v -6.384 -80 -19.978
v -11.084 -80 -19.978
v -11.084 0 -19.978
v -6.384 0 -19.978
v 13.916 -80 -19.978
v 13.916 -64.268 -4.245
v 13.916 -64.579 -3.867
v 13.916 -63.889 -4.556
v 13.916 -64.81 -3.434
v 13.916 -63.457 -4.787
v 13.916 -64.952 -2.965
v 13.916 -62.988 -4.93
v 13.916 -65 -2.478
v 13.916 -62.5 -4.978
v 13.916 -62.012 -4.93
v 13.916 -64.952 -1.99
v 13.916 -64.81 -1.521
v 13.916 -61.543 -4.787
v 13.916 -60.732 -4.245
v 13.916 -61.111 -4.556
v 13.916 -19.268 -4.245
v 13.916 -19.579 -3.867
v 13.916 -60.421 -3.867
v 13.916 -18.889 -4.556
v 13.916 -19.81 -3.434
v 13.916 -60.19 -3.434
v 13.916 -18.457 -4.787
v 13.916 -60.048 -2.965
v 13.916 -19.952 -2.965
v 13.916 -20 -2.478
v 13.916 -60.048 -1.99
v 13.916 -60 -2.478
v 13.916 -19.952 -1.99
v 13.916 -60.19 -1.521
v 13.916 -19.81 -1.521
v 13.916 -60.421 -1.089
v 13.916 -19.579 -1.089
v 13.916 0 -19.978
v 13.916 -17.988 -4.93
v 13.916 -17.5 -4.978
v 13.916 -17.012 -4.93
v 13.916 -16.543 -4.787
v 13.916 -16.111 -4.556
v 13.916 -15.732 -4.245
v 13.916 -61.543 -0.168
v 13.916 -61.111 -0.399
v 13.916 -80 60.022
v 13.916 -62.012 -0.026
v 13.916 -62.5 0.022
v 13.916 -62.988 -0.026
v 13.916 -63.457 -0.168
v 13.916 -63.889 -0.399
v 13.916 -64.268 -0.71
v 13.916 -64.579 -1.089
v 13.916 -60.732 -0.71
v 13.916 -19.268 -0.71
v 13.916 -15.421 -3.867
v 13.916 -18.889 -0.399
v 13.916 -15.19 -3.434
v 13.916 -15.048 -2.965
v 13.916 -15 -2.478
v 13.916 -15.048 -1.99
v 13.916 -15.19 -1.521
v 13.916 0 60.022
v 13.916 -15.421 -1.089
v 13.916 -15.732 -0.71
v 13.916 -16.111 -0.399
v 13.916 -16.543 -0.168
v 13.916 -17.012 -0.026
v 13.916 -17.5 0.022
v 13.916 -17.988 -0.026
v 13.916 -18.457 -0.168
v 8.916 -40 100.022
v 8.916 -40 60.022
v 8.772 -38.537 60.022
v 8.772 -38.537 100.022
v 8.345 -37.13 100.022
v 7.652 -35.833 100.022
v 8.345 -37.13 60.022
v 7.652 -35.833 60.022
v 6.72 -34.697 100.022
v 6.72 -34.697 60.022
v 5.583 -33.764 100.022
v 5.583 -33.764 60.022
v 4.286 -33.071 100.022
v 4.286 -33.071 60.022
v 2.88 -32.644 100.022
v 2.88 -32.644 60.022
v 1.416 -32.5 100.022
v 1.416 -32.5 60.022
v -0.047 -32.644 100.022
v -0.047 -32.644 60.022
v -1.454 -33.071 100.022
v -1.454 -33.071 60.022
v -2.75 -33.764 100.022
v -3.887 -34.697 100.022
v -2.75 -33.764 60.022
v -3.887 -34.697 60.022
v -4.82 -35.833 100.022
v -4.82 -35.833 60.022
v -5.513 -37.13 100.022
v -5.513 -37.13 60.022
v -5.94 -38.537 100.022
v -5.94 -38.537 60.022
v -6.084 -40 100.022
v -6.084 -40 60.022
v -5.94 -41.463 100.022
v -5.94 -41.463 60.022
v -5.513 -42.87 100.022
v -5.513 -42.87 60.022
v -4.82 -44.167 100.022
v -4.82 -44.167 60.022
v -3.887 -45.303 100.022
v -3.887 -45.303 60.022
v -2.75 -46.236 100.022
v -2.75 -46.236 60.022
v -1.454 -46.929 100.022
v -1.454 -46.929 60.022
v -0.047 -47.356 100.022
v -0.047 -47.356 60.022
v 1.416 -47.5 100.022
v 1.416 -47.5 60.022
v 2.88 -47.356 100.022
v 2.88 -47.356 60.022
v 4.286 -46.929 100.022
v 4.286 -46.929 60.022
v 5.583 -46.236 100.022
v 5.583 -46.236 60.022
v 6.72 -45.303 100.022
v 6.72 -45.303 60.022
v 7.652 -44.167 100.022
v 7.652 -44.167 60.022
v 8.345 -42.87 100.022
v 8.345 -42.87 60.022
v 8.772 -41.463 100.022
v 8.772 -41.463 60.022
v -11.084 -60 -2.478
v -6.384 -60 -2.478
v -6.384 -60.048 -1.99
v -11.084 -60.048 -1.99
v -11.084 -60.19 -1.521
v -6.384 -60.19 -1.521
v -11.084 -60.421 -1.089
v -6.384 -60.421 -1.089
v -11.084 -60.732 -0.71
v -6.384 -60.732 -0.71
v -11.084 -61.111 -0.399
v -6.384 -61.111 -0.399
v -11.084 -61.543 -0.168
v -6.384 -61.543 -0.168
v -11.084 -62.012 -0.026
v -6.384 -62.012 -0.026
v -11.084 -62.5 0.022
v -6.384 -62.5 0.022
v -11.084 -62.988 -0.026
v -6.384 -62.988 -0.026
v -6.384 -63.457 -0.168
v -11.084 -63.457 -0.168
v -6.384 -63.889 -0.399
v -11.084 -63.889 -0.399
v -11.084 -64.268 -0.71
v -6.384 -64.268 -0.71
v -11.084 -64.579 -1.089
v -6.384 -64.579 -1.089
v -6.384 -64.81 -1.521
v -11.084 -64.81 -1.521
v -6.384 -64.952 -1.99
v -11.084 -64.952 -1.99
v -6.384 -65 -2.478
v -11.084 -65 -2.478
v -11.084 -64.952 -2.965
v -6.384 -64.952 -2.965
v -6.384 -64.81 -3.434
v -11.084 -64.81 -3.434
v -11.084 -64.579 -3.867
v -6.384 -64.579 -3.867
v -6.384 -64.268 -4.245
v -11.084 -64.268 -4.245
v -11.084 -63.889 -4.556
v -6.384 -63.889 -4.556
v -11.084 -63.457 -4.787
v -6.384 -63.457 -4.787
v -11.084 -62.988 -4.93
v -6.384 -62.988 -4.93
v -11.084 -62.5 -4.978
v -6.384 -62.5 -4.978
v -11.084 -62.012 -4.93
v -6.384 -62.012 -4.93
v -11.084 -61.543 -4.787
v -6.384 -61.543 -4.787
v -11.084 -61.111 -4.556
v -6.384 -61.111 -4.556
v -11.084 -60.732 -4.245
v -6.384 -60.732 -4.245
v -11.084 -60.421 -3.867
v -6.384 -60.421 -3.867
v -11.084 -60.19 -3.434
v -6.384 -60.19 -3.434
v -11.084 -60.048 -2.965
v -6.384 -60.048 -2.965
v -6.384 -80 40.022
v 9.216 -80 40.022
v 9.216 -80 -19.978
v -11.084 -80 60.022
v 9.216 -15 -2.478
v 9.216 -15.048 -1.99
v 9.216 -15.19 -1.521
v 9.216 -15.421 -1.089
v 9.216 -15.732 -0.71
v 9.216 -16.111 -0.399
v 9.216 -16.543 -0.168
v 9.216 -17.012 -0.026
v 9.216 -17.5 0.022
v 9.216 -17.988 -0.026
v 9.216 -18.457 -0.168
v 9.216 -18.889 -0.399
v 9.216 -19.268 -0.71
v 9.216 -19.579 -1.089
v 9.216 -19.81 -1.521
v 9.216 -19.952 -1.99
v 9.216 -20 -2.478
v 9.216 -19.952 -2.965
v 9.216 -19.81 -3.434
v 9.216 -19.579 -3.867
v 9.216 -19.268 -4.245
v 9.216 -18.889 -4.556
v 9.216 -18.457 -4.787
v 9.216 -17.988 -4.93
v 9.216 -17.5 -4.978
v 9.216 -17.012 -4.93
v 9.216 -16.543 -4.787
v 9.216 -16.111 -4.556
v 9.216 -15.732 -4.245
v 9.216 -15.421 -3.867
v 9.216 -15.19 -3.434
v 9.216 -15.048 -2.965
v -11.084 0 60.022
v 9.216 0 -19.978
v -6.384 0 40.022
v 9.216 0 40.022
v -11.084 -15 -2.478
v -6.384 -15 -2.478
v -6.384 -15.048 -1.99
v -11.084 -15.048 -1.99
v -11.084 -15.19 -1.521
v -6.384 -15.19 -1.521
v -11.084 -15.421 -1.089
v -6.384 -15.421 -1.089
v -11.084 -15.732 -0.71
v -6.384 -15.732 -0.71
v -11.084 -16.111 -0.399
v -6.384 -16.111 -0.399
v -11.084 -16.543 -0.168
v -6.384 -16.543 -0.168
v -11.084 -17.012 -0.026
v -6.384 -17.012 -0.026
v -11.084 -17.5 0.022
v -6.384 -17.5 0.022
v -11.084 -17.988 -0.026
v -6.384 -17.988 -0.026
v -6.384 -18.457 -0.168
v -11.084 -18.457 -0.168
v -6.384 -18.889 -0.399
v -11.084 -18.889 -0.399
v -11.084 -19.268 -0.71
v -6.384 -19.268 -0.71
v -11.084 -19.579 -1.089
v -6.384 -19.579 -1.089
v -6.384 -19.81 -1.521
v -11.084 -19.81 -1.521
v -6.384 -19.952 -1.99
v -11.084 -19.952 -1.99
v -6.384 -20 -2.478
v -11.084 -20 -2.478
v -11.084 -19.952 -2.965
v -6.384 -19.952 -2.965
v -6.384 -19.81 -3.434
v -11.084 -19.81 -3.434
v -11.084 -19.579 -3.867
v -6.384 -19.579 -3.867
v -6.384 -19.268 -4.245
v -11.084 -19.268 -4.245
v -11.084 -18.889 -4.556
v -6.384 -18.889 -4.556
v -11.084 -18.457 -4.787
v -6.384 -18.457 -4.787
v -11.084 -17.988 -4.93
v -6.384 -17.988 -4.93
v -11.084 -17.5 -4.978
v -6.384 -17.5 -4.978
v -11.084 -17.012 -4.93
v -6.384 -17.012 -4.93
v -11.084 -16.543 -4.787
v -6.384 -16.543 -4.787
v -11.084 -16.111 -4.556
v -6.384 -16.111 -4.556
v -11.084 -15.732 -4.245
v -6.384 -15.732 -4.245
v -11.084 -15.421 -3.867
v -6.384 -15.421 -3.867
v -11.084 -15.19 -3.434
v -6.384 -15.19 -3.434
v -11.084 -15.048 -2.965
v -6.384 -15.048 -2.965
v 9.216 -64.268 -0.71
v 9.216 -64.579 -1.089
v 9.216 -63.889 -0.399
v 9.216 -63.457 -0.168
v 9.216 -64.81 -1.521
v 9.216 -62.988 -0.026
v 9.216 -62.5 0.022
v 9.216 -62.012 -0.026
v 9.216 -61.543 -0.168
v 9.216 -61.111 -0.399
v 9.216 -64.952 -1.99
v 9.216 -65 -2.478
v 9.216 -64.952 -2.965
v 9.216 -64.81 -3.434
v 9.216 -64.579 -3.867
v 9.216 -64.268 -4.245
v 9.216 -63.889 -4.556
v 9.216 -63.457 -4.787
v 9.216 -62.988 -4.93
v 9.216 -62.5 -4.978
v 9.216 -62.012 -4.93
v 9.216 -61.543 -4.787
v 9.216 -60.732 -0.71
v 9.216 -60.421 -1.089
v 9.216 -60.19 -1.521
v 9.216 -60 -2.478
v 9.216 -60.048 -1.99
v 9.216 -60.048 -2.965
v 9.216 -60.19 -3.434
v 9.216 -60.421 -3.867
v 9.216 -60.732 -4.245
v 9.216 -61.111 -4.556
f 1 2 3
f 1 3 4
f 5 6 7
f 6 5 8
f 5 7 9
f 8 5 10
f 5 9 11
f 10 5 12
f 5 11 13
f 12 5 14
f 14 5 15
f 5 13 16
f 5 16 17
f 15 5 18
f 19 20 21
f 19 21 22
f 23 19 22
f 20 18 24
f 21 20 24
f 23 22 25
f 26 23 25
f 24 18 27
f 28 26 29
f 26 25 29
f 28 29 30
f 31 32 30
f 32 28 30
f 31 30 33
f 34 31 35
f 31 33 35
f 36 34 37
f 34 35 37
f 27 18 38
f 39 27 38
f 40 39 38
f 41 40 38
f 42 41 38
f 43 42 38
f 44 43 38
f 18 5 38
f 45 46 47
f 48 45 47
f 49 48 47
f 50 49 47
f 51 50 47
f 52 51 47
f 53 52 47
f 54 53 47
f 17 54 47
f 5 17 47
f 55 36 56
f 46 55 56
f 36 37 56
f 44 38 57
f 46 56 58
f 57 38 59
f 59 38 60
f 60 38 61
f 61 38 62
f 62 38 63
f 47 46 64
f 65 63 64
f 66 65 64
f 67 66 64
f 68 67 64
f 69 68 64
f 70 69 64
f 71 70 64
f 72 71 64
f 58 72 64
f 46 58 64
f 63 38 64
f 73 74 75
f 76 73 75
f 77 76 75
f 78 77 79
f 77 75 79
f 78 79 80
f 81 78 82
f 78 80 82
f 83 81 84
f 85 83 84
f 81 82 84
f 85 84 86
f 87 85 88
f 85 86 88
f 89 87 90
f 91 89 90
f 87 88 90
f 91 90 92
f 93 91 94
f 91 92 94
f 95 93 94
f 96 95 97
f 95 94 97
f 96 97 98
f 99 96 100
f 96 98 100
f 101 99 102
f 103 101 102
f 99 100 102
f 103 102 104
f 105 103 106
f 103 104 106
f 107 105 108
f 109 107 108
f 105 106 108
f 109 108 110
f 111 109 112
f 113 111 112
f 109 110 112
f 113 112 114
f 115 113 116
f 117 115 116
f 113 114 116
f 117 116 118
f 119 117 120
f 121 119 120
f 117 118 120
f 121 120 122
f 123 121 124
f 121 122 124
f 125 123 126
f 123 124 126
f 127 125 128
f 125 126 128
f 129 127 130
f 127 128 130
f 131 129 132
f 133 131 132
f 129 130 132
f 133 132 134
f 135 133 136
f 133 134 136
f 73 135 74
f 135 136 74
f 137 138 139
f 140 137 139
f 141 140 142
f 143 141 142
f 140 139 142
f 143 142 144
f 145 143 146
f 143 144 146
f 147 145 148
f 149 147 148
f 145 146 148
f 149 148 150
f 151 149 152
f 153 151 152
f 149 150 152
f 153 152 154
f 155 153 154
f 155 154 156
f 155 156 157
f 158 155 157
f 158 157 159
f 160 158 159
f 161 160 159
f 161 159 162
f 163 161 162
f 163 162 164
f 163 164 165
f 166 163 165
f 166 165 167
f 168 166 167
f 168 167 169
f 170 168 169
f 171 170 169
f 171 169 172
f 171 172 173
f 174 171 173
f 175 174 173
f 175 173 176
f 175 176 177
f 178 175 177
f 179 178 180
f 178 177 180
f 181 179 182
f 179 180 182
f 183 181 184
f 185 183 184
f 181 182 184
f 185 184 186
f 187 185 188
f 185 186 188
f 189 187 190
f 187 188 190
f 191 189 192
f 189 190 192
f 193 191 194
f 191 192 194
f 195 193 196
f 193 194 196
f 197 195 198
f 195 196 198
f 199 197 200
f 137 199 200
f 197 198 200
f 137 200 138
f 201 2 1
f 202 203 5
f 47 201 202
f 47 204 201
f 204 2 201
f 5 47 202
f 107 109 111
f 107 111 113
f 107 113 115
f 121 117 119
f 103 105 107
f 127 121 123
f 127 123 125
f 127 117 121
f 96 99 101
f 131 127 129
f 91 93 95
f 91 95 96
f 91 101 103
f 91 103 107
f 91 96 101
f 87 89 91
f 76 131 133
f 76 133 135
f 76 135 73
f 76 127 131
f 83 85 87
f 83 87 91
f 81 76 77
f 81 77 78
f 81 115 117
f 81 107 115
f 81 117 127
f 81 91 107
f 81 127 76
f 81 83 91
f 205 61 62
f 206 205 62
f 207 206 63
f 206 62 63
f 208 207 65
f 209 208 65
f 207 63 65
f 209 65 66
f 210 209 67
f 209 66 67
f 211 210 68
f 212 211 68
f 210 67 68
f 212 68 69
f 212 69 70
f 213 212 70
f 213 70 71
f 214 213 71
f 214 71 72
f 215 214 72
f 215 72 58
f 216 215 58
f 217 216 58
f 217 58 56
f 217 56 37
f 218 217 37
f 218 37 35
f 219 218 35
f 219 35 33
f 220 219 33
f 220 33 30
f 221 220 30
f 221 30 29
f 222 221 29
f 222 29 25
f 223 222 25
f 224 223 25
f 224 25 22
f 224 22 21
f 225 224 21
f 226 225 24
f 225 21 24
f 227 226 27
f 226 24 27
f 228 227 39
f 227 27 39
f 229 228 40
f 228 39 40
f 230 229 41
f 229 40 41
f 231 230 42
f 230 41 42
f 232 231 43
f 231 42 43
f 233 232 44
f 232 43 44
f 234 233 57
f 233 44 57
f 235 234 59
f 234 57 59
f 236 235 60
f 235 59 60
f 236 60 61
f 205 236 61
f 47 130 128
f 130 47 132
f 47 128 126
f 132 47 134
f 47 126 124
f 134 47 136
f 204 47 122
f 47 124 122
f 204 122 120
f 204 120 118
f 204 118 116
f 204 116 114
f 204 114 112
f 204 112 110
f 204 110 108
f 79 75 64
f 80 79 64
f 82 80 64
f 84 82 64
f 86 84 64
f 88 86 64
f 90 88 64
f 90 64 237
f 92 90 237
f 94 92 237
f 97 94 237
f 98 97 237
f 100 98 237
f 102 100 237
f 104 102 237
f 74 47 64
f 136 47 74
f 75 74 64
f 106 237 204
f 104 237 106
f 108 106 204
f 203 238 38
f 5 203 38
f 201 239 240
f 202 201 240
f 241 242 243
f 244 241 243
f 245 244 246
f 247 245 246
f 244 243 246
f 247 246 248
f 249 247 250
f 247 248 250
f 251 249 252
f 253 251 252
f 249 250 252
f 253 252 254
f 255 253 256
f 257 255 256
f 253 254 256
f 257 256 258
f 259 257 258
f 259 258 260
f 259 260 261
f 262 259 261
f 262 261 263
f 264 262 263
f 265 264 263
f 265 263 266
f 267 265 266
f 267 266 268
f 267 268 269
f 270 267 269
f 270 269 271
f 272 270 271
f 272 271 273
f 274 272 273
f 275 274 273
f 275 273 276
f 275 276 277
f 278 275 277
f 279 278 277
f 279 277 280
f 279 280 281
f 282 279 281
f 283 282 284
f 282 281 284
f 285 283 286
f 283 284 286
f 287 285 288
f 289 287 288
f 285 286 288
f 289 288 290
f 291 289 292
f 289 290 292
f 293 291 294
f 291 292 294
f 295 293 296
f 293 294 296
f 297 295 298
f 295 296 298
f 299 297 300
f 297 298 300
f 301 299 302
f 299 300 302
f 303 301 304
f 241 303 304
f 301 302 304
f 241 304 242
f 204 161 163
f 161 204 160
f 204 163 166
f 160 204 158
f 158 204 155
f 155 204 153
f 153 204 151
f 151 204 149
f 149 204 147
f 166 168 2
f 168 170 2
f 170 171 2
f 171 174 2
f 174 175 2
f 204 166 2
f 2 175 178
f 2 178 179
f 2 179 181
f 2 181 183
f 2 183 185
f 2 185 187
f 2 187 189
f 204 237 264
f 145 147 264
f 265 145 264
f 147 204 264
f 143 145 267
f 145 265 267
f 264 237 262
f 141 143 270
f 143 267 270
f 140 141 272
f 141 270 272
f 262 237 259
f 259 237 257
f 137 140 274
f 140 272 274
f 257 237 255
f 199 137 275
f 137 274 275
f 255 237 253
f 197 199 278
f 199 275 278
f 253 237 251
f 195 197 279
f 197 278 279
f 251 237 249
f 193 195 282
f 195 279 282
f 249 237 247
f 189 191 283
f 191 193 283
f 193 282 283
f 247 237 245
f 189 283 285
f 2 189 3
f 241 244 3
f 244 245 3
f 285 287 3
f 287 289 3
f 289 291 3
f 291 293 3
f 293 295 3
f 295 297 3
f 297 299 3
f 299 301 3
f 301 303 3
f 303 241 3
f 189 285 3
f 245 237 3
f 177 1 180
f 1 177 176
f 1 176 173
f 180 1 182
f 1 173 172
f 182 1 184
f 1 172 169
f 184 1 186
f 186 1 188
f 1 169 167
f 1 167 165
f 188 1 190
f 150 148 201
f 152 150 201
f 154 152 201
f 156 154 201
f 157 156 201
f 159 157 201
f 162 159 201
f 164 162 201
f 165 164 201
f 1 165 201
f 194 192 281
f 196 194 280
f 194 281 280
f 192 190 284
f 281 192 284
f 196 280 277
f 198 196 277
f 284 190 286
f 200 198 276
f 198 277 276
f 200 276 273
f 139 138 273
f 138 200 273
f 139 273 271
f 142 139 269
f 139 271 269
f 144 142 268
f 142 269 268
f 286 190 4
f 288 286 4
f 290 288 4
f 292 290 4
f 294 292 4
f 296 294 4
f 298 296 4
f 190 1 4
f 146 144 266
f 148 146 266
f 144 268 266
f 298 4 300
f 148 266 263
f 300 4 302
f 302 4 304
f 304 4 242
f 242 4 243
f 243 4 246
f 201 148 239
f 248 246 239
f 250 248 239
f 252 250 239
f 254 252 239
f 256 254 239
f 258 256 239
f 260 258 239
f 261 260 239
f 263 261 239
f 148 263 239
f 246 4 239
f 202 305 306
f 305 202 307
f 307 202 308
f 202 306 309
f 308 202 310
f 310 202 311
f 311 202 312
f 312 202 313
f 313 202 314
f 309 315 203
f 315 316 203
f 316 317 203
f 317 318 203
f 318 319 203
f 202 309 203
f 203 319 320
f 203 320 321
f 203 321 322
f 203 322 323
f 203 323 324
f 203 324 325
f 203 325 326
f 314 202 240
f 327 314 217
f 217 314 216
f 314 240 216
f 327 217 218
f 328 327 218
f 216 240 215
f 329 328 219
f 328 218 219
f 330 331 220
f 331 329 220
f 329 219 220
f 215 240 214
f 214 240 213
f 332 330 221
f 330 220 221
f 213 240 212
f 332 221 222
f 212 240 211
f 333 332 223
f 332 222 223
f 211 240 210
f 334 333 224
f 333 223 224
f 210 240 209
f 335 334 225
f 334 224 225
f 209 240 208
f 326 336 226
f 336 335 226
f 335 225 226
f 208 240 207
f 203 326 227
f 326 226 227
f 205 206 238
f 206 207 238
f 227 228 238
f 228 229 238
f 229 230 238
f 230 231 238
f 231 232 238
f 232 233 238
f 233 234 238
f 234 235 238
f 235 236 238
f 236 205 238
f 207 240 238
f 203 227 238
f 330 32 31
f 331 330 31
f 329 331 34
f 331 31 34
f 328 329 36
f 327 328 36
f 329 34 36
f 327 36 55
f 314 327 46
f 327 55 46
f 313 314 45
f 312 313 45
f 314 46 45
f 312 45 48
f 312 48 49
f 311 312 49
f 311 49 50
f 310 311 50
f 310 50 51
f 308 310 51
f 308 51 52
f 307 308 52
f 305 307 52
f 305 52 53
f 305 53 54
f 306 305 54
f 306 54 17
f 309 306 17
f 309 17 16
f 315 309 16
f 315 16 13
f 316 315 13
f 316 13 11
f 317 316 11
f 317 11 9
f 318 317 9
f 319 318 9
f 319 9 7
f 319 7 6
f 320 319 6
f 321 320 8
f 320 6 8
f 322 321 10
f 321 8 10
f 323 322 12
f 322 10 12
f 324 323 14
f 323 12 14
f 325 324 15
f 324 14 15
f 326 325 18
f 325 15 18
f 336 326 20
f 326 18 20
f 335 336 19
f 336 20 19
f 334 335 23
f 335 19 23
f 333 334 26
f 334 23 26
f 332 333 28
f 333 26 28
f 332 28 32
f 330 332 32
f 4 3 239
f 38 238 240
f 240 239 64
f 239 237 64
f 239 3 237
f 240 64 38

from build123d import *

# Parameters (mm, degrees)
F1_DEPTH = 80
F2_R     = 7.5
F3_DEPTH = 40
F4_R     = 2.5
F5_DEPTH = 50


with BuildPart() as f1:
    # F0 (on Front) → F1 (new body)
    with BuildSketch(Plane.XZ):
        Polygon((13.916367, 60.022387), (-11.083633, 60.022387), (-11.083633, -19.977613), (-6.383633, -19.977613), (-6.383633, 40.022387), (9.216367, 40.022387), (9.216367, -19.977613), (13.916367, -19.977613), align=None)
    extrude(amount=F1_DEPTH)

    # F2 (on face) → F3 (join)
    with BuildSketch(Plane.XY.offset(60.022387)):
        with Locations((1.416367, -40)):
            Circle(F2_R)
    extrude(amount=F3_DEPTH)

    # F4 (on face) → F5 (cut)
    with BuildSketch(Plane.YZ.offset(13.916367)):
        with Locations((-62.5, -2.477613)):
            Circle(F4_R)
        with Locations((-17.5, -2.477613)):
            Circle(F4_R)
    extrude(amount=-F5_DEPTH, mode=Mode.SUBTRACT)


solid = f1.part
